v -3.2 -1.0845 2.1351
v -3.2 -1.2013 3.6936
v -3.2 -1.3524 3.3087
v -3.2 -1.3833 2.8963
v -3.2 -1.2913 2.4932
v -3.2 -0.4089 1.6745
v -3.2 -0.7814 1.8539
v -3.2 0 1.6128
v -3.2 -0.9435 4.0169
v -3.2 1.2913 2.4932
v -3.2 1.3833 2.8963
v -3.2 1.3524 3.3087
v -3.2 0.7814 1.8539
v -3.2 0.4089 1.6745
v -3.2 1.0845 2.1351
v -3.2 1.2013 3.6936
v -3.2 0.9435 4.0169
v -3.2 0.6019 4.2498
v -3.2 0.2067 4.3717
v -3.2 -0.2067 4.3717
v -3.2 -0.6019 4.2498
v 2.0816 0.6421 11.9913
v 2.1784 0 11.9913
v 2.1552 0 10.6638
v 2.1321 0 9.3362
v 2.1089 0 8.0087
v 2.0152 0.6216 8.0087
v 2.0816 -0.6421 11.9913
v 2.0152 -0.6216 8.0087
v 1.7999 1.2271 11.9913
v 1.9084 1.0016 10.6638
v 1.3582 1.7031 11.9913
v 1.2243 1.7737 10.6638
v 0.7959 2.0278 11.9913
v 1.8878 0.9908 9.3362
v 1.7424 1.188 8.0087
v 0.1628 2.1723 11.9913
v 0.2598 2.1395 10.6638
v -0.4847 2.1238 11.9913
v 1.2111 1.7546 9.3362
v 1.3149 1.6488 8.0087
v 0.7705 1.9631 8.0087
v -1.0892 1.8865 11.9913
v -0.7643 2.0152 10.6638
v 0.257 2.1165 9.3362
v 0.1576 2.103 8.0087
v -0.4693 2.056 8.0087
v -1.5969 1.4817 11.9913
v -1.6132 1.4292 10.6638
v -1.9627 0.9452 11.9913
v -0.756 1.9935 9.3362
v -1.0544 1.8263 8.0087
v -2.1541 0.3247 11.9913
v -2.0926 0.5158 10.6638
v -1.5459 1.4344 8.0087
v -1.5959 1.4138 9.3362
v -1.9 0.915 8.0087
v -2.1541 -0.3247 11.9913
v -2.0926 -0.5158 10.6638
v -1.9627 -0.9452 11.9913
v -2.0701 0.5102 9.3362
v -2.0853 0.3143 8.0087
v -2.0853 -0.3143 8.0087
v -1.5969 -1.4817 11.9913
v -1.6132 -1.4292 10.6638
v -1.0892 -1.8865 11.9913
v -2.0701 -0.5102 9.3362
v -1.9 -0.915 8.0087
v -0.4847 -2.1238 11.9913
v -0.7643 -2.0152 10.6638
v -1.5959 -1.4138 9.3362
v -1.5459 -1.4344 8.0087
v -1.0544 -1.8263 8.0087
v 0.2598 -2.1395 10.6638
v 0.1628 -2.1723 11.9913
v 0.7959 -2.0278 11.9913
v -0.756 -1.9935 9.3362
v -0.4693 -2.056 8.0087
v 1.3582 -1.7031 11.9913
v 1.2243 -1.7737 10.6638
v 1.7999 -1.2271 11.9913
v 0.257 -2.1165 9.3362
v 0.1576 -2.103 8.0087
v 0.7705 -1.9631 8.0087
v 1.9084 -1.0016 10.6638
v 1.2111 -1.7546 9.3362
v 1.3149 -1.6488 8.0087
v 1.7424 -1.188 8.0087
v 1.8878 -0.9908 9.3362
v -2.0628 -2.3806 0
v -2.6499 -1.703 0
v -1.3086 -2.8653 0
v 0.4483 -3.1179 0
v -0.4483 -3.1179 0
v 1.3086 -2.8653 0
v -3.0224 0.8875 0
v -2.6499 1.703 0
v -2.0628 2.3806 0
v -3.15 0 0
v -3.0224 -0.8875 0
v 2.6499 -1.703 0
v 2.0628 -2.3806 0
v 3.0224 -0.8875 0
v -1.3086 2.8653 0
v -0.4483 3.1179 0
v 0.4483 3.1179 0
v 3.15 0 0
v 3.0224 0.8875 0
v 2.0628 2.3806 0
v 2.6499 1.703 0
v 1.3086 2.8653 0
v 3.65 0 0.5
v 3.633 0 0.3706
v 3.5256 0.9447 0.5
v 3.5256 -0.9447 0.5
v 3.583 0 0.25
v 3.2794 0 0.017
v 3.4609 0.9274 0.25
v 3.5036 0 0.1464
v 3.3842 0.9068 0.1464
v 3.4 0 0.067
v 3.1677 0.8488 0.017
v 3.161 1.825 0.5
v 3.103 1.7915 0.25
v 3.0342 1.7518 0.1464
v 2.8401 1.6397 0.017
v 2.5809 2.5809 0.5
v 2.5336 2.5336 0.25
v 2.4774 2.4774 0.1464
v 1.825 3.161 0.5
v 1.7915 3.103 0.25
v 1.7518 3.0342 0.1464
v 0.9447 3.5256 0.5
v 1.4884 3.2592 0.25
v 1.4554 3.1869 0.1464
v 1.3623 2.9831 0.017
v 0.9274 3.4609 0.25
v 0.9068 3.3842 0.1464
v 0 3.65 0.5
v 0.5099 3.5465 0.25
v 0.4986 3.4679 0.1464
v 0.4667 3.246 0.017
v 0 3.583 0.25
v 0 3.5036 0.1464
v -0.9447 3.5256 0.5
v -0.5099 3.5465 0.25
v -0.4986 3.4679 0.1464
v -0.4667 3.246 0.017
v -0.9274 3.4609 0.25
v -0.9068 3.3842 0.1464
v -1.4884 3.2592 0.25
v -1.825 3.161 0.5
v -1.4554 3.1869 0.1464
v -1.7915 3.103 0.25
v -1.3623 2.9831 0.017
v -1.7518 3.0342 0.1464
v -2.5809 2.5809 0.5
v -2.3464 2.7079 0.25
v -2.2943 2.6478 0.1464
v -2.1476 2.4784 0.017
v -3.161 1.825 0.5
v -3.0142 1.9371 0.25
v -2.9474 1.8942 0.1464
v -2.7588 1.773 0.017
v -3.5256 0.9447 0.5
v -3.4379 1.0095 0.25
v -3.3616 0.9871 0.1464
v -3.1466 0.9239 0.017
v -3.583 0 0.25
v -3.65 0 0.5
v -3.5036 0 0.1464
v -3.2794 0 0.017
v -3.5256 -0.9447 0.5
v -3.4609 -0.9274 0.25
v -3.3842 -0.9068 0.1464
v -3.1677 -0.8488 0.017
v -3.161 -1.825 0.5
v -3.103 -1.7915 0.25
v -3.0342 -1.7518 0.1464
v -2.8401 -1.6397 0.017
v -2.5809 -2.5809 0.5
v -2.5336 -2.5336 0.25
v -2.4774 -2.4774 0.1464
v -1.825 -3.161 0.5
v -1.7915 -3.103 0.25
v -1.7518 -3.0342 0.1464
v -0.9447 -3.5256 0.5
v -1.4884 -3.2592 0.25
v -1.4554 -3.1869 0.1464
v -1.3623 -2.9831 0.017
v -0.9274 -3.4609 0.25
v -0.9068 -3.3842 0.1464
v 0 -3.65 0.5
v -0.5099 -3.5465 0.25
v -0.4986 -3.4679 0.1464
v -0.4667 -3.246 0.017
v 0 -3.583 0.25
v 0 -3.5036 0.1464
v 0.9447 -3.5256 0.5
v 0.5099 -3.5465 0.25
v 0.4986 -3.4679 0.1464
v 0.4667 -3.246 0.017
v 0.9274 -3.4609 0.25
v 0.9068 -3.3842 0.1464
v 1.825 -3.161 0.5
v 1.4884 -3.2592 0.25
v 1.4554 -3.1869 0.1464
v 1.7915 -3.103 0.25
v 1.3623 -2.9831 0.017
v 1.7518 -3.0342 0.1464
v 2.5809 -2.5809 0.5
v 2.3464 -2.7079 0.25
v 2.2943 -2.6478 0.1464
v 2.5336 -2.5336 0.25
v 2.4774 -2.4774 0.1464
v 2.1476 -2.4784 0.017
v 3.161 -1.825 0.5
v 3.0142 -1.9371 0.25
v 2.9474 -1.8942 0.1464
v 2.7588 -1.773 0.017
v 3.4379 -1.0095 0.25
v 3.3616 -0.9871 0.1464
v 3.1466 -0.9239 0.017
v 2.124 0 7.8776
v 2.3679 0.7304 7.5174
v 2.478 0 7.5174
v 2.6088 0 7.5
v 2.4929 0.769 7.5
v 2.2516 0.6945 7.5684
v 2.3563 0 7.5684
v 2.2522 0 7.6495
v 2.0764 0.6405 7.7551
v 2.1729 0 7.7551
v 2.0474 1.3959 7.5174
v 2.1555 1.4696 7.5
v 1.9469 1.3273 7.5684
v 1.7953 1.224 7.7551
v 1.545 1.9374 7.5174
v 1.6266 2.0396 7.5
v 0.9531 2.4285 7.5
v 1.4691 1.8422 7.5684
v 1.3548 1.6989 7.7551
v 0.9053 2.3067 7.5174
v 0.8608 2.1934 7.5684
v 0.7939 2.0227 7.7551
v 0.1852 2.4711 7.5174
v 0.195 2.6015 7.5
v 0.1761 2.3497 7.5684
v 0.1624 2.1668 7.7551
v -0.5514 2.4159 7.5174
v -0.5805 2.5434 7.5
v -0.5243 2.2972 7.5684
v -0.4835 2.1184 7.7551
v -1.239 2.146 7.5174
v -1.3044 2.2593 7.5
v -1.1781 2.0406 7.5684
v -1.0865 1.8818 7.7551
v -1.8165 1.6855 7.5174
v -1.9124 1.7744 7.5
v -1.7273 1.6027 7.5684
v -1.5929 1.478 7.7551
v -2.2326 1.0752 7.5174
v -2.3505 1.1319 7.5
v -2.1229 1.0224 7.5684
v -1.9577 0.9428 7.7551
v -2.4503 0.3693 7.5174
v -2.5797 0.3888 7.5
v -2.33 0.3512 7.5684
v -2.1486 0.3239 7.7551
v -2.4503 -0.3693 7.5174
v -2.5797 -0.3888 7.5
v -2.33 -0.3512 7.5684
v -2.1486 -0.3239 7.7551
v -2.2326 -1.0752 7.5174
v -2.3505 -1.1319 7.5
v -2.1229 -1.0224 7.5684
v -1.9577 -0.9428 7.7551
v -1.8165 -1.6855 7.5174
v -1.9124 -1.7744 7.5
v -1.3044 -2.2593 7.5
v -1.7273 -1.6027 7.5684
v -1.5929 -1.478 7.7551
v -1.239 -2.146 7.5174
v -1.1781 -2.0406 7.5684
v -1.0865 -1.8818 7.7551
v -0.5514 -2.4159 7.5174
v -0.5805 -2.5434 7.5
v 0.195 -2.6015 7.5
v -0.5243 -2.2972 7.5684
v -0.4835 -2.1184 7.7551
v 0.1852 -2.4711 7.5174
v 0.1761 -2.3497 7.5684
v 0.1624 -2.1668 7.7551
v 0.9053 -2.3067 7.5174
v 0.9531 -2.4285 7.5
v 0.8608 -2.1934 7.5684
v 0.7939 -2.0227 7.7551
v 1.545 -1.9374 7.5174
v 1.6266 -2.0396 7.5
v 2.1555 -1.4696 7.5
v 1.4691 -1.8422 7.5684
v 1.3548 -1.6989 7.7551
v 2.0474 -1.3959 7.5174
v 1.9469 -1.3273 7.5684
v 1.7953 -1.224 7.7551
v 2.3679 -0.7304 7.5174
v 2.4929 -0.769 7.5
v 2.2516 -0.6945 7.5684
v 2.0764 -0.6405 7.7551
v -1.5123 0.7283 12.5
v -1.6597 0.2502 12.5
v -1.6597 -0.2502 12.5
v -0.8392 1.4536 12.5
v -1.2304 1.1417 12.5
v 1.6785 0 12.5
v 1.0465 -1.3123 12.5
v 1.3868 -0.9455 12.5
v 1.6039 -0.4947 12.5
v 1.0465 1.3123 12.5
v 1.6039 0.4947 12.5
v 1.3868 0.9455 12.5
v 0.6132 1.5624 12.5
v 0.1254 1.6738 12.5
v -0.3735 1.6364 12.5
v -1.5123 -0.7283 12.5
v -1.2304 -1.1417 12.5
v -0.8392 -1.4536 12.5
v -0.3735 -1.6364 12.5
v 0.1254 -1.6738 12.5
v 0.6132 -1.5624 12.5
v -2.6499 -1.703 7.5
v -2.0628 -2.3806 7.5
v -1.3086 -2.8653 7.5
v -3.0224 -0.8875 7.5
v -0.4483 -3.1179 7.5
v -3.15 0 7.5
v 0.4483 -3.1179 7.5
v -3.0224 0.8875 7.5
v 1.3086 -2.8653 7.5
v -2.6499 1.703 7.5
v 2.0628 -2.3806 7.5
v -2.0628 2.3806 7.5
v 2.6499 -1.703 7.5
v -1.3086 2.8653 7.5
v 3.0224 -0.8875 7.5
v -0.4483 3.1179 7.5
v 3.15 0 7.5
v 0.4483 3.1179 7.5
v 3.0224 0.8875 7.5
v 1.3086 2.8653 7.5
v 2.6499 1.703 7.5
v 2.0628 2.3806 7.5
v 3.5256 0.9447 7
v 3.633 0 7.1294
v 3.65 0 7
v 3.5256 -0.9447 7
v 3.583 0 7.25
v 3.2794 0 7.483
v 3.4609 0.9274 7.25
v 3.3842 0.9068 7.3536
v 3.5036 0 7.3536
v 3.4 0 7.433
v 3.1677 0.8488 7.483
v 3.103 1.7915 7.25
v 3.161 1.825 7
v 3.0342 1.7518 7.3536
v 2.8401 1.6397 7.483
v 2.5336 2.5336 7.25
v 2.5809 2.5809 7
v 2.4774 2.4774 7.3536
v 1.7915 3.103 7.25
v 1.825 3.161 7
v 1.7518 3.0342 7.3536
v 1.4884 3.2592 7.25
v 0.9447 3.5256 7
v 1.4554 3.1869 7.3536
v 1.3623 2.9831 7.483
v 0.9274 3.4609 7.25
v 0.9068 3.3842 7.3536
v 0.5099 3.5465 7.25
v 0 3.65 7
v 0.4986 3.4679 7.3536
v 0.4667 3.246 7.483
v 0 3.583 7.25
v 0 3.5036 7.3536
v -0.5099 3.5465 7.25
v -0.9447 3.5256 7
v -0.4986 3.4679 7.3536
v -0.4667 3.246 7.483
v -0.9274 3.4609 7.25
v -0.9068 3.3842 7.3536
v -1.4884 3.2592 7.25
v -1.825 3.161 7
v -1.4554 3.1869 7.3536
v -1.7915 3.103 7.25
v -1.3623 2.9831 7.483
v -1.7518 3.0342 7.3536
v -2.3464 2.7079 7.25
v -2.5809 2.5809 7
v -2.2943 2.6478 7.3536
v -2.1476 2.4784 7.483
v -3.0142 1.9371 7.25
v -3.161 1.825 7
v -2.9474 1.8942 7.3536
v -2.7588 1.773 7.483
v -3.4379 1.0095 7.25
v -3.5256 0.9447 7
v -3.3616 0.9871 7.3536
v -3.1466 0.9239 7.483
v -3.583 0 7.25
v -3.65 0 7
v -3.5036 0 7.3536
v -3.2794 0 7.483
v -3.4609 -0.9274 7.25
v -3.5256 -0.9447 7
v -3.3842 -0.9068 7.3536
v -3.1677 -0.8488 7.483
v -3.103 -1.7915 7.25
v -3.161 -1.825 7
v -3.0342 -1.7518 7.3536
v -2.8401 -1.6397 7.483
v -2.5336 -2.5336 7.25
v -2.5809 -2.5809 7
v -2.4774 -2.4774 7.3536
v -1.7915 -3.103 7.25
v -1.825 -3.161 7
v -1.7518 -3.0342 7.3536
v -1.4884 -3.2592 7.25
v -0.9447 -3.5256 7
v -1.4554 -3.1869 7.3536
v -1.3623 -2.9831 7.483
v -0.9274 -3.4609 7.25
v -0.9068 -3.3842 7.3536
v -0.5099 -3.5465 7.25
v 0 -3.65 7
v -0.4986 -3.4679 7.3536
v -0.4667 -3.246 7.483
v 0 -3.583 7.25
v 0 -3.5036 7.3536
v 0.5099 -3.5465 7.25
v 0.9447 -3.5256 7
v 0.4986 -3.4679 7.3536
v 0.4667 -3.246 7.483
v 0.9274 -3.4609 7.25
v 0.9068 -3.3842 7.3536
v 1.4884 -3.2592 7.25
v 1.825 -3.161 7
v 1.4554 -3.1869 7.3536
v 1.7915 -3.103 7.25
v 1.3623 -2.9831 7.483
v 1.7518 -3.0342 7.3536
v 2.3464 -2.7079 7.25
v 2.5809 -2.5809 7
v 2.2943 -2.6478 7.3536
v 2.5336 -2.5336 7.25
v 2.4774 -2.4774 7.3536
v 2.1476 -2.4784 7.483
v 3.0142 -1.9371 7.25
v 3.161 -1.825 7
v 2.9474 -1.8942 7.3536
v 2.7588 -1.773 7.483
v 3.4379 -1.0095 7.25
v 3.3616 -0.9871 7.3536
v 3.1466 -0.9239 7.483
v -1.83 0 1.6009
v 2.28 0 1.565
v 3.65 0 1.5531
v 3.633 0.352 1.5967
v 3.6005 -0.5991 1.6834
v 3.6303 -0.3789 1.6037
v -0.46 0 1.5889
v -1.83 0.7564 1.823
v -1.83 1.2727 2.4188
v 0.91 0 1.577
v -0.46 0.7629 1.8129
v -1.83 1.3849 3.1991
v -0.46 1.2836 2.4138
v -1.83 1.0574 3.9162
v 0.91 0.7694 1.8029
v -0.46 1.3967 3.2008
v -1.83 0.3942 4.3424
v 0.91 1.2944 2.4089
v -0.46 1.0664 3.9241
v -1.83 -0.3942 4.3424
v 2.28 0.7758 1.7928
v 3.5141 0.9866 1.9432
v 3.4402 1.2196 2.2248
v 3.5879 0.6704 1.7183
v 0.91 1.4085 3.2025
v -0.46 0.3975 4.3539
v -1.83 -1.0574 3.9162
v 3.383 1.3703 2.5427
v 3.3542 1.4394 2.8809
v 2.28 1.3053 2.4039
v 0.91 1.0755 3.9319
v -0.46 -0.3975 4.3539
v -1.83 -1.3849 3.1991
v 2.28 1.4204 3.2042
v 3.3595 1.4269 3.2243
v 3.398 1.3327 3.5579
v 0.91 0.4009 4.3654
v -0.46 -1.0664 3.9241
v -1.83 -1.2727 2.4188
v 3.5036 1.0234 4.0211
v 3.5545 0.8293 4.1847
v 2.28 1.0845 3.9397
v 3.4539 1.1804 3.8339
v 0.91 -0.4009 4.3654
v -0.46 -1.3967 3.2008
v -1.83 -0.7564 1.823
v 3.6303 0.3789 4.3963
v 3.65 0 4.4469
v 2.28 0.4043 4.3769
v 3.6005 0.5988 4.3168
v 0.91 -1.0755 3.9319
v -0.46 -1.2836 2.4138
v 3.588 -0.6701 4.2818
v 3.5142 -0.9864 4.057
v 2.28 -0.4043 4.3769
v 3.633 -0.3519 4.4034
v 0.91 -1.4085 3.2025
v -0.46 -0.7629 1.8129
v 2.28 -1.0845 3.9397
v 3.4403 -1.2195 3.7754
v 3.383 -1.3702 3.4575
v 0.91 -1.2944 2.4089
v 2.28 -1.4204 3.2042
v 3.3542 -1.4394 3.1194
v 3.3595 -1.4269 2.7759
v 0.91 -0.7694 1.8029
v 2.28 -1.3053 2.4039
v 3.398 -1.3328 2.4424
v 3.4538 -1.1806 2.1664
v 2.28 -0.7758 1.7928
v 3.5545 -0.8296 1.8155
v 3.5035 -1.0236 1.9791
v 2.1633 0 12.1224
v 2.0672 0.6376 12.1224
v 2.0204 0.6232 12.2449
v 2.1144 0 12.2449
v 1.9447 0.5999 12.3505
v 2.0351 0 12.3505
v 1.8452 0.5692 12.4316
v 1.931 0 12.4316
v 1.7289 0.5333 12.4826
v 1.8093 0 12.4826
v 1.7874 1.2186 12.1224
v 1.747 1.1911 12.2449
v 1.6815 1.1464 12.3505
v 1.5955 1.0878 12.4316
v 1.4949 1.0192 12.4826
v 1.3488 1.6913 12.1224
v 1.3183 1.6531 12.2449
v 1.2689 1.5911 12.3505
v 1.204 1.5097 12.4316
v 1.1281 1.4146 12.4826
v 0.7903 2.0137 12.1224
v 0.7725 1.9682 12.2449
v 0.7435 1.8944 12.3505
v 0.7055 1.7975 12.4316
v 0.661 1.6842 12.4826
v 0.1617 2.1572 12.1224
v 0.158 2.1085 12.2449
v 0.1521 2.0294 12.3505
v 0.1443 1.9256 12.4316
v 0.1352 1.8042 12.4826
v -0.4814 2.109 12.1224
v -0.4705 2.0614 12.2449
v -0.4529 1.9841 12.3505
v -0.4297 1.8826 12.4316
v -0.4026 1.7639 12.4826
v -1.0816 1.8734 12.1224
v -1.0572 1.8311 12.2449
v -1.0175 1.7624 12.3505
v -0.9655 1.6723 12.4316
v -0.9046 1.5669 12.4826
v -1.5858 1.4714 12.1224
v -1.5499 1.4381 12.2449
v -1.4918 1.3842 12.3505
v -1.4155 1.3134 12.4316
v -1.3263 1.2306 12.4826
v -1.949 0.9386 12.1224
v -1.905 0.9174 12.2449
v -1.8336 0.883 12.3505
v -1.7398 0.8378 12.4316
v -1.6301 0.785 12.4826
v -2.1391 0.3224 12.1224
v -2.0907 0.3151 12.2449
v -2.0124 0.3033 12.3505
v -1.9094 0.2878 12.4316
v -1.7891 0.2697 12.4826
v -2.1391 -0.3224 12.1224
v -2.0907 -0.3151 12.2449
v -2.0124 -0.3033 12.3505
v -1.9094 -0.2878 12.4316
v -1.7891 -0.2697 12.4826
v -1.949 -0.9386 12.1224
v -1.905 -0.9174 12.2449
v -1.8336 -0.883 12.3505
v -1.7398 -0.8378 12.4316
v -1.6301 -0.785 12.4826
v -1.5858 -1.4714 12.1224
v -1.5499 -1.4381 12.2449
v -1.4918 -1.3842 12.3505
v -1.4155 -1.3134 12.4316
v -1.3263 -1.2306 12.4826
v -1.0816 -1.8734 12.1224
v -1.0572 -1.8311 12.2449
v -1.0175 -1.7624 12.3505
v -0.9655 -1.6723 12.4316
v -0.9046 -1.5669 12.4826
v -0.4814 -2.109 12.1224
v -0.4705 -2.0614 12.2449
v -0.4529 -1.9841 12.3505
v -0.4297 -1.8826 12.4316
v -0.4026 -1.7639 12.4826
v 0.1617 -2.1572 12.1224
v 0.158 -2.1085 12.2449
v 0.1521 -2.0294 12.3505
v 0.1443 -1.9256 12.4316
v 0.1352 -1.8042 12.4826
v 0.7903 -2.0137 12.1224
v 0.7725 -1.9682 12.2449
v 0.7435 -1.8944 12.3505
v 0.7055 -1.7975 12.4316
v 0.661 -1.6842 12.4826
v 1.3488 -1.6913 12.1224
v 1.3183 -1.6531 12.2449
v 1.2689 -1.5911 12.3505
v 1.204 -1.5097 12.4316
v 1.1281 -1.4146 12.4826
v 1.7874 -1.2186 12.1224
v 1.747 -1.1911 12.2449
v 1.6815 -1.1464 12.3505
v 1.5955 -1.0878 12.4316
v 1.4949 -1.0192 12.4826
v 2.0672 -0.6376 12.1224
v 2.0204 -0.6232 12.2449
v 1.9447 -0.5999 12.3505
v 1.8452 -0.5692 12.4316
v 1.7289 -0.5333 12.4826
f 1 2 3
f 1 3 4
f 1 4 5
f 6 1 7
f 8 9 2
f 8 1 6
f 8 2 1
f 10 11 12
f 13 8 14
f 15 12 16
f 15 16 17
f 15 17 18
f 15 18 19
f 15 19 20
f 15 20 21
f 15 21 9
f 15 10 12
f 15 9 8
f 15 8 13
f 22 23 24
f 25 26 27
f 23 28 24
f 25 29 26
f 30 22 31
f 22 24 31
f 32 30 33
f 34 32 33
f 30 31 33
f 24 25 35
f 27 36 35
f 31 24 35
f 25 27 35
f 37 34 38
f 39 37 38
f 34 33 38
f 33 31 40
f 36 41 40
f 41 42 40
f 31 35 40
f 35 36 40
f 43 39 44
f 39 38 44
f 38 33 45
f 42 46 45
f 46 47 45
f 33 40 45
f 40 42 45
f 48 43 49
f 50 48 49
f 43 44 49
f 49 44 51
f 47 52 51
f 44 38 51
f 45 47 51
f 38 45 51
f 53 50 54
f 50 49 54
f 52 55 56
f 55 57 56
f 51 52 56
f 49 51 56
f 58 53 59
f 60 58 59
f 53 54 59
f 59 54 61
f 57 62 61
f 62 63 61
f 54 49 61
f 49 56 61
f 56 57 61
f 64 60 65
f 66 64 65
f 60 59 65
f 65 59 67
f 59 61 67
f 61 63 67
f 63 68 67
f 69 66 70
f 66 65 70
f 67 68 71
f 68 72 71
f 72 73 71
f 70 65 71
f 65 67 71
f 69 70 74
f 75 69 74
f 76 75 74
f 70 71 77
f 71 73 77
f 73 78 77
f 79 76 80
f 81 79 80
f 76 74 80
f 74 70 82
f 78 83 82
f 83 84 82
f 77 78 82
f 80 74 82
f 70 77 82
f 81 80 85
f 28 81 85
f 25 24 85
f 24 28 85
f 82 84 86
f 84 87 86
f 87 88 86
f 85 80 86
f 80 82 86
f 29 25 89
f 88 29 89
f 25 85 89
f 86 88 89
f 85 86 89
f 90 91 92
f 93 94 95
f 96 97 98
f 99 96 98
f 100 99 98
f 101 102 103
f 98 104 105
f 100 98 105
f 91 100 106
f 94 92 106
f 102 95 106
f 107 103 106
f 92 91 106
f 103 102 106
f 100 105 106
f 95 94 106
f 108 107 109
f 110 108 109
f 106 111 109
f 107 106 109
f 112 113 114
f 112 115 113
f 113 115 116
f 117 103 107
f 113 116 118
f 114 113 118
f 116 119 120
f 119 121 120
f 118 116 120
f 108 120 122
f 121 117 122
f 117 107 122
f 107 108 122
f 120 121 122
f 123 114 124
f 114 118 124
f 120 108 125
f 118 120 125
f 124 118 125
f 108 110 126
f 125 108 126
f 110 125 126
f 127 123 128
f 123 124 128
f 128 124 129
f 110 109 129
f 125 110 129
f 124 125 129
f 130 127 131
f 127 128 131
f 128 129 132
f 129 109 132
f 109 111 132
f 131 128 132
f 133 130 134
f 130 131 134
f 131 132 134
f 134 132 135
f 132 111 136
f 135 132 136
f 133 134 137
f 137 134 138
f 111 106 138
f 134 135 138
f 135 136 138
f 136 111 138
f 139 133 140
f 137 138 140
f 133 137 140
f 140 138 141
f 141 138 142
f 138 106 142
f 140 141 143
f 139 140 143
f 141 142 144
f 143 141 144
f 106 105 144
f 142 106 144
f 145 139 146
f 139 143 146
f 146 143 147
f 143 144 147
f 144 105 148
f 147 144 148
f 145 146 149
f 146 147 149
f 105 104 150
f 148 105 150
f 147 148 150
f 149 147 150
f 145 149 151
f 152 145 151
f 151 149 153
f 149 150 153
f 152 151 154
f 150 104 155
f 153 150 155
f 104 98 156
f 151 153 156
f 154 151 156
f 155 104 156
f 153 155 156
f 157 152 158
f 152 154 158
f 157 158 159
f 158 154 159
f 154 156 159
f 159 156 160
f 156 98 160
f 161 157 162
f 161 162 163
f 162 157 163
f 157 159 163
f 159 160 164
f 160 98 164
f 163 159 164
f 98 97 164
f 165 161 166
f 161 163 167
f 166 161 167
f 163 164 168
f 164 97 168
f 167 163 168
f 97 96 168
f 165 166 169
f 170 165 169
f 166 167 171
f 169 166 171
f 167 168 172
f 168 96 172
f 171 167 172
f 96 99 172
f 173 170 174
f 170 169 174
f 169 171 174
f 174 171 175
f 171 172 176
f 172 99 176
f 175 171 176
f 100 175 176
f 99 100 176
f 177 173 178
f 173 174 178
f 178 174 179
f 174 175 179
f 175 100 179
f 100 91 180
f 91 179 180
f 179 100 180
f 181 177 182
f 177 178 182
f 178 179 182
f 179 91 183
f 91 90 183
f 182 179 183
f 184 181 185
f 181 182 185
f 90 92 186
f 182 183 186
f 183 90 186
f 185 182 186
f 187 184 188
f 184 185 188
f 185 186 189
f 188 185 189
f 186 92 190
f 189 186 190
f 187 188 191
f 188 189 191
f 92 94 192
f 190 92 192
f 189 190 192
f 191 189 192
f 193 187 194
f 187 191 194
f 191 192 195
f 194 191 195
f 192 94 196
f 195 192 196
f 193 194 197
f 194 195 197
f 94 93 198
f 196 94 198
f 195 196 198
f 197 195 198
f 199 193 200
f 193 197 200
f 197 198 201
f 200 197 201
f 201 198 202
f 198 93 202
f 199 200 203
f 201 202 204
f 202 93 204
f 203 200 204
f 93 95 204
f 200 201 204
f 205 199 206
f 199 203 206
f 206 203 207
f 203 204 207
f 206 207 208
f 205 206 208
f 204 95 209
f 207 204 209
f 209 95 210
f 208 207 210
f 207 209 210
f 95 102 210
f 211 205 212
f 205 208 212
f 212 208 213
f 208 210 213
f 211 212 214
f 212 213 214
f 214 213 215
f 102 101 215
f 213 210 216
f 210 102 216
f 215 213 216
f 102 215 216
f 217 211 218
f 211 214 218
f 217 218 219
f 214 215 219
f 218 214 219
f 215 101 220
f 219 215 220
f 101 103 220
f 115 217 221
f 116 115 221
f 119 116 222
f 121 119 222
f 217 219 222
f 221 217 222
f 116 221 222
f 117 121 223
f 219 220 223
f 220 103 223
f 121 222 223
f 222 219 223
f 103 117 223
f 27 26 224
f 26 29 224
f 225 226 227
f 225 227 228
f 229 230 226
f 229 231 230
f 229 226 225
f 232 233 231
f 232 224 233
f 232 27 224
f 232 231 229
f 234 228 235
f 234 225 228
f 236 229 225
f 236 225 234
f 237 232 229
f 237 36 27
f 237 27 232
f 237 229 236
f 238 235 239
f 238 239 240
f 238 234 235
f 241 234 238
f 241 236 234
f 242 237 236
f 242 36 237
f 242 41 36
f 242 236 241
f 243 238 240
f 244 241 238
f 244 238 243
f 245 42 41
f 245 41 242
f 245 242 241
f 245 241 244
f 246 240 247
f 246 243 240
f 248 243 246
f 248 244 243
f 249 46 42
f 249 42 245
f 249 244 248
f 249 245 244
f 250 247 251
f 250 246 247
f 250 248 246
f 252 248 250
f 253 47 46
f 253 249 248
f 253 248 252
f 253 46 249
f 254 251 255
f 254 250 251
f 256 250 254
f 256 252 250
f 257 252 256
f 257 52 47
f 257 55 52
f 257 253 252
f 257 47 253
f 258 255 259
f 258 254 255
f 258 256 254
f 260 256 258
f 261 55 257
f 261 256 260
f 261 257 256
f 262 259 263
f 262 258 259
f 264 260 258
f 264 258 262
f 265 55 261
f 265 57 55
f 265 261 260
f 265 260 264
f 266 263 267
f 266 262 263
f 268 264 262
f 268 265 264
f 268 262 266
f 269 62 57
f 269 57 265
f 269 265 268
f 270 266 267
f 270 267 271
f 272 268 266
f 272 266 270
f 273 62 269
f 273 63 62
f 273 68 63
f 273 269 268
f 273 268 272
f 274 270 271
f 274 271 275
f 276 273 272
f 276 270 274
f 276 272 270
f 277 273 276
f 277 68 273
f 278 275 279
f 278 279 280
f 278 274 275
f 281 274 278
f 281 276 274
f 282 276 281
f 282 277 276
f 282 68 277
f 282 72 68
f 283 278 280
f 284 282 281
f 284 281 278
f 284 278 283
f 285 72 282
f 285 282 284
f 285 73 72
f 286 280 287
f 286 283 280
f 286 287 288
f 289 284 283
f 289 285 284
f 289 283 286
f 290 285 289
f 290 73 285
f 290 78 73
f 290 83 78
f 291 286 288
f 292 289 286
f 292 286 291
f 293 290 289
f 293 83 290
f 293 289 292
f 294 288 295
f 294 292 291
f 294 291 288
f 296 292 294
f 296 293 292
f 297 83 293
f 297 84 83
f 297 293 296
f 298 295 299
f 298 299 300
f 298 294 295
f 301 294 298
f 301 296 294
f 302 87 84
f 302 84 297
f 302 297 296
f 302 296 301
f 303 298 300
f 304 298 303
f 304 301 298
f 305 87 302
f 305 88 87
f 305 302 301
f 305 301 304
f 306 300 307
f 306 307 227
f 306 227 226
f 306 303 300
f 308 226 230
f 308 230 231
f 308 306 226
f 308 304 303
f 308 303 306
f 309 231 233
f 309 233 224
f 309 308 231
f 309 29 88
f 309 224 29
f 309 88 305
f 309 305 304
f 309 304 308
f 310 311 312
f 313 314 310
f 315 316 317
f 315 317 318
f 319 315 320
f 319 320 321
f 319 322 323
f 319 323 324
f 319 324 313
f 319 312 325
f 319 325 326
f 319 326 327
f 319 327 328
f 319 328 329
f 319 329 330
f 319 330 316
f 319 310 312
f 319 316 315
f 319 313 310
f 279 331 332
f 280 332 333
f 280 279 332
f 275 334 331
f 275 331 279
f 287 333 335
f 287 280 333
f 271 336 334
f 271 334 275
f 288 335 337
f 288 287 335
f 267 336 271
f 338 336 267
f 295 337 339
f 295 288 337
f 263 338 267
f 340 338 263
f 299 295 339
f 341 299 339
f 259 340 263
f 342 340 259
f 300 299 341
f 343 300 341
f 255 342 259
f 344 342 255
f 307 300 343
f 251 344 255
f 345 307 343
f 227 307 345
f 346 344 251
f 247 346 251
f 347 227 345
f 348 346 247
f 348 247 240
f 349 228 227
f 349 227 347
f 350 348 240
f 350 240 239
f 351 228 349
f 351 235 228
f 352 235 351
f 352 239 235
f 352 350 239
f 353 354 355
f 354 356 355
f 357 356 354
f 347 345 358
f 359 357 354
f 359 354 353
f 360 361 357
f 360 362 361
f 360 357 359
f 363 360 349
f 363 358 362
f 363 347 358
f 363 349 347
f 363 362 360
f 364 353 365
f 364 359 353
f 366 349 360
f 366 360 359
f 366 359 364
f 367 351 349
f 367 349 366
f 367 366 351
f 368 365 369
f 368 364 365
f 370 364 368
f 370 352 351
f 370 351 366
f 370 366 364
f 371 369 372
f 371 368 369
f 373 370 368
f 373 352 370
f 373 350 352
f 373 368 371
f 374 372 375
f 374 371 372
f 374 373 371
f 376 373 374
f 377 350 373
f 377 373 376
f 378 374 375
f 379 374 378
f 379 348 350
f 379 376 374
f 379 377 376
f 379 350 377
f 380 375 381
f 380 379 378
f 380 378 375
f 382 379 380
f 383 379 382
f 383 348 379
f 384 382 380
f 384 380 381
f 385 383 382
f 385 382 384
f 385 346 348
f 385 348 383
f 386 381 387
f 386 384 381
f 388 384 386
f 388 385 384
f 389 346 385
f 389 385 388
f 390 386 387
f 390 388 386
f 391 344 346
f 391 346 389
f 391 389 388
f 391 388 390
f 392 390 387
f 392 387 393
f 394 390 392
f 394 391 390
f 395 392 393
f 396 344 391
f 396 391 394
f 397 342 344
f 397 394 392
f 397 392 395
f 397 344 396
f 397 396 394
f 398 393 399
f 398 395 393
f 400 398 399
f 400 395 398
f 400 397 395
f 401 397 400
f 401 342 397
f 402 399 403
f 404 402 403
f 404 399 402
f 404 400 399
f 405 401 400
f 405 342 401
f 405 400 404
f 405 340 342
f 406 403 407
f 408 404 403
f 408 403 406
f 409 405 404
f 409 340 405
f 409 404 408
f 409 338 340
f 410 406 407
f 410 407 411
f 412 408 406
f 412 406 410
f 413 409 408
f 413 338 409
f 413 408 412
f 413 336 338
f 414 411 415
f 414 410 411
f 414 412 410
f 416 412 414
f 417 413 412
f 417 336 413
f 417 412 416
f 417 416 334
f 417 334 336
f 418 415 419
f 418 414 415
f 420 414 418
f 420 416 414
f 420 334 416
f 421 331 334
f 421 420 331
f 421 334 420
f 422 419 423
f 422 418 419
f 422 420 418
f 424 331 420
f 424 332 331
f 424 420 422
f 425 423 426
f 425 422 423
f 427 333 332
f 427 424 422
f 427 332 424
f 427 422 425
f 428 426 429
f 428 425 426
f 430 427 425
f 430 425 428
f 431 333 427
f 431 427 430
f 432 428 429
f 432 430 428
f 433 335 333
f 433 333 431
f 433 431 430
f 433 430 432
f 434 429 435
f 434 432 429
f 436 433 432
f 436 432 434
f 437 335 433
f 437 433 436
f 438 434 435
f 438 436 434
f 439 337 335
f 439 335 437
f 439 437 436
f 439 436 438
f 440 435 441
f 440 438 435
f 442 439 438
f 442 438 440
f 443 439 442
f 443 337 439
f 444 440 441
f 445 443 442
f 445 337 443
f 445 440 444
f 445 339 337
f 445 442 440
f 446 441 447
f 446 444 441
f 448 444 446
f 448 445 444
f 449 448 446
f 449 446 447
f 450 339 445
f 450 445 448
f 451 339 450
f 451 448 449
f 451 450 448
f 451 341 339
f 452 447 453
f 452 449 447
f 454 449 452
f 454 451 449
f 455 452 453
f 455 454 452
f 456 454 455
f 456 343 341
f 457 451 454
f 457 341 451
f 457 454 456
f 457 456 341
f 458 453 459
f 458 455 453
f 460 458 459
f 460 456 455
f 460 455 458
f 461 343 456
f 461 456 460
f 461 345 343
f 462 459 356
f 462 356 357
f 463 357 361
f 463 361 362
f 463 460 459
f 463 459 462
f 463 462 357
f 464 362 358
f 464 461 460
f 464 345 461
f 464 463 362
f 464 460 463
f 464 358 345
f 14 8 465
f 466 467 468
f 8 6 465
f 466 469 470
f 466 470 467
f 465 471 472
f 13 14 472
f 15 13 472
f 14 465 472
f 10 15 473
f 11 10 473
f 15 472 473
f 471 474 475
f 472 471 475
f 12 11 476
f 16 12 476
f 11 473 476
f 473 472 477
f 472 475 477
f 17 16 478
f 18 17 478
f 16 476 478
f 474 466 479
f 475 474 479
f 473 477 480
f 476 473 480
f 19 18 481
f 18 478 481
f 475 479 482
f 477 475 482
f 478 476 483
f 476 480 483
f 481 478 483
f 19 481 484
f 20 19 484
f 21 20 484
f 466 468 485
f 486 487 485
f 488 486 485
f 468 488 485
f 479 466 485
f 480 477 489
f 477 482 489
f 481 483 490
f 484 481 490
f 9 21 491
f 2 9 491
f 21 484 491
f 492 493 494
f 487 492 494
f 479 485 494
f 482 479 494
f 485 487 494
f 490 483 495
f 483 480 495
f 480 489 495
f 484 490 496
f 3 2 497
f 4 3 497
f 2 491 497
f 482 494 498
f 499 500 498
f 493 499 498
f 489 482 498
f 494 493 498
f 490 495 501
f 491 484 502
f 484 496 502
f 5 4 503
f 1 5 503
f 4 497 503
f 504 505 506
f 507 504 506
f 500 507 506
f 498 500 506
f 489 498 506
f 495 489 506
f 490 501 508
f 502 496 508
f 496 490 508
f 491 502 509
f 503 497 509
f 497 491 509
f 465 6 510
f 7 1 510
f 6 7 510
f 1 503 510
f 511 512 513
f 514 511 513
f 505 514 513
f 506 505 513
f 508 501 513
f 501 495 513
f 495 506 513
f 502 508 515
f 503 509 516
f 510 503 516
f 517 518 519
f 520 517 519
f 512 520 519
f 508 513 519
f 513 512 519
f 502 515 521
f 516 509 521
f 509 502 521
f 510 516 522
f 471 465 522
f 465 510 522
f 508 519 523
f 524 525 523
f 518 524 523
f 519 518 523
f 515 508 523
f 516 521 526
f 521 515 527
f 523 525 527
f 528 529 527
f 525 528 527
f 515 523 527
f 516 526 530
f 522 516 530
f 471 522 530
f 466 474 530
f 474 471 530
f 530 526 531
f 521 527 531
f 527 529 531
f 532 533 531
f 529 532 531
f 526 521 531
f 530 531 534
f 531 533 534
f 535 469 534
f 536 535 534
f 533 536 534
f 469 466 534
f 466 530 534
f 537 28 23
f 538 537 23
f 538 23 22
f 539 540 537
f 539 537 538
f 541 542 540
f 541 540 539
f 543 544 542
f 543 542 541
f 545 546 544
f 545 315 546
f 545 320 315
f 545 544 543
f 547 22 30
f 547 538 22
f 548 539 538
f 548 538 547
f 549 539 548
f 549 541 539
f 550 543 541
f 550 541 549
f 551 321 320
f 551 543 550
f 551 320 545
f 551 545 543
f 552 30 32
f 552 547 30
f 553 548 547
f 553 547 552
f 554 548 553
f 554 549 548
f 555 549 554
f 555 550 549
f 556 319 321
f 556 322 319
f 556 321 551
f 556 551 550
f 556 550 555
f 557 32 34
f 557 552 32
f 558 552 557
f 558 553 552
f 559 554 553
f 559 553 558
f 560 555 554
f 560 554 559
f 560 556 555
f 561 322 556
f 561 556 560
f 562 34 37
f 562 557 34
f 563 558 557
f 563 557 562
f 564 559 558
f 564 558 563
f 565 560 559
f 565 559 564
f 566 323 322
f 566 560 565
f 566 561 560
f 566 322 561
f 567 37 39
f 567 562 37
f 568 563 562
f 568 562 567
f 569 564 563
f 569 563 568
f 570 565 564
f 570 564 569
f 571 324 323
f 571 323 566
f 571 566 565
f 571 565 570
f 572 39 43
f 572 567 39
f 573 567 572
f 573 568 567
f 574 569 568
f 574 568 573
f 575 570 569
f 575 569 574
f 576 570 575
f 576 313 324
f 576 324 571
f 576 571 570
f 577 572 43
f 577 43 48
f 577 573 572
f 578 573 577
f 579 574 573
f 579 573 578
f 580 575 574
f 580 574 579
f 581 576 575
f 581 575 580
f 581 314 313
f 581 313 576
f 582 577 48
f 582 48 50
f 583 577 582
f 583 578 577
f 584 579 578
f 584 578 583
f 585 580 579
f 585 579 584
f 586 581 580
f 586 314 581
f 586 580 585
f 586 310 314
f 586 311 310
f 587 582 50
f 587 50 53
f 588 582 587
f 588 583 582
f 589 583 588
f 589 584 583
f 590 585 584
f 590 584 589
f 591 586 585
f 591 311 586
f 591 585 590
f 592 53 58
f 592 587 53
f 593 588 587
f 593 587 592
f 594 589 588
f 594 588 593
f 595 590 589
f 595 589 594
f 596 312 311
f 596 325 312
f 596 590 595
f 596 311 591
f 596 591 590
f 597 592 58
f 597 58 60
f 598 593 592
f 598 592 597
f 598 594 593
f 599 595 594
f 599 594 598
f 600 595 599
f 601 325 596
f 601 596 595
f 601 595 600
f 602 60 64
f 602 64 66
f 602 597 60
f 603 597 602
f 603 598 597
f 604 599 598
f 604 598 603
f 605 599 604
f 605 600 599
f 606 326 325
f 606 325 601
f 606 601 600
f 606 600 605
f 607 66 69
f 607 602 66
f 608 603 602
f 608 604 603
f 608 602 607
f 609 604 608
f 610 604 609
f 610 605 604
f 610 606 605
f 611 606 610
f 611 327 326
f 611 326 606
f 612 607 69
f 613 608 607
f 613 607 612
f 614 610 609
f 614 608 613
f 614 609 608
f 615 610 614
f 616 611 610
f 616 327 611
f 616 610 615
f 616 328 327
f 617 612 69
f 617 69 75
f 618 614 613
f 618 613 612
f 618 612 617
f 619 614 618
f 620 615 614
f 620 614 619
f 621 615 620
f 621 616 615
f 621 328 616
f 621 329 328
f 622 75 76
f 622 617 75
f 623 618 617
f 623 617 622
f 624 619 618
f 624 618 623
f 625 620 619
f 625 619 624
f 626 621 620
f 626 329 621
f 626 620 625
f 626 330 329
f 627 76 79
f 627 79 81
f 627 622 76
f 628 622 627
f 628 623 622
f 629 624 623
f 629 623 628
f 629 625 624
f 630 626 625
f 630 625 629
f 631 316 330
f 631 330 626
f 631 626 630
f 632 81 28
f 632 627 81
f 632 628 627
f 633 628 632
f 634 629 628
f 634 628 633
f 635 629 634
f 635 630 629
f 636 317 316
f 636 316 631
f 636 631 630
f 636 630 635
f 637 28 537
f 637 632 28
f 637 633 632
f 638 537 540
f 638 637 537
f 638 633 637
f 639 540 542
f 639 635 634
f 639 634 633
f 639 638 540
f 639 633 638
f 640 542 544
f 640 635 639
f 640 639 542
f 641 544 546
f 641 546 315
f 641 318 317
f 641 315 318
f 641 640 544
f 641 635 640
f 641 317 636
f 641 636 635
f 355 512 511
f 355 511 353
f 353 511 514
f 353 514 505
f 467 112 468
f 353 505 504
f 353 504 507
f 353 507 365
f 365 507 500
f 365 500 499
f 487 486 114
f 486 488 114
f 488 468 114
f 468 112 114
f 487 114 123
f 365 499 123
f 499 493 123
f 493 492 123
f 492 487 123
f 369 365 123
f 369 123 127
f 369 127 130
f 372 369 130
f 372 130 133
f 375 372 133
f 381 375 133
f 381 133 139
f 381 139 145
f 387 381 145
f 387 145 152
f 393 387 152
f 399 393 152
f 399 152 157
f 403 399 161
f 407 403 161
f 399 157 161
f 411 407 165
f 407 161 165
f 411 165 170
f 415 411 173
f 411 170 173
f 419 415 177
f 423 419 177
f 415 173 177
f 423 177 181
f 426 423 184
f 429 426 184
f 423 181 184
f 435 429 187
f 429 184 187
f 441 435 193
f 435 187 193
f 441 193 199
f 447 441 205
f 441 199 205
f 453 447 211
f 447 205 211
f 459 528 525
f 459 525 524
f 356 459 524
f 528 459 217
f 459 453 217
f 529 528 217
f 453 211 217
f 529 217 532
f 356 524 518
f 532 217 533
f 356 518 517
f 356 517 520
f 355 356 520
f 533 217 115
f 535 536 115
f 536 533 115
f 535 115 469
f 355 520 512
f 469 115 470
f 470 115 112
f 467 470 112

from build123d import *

# Parameters (mm, degrees)
ESQUISSE1_R             = 3.65
BOSS_EXTRU_1_DEPTH      = 7.5
ESQUISSE2_R             = 1.45
ENL_V_MAT_EXTRU_1_DEPTH = 7.2
ENL_V_MAT_EXTRU_1_DRAFT = -0.5
ESQUISSE3_R             = 2.1
BOSS_EXTRU_2_DEPTH      = 5
BOSS_EXTRU_2_DRAFT      = -1
CONG_2_R                = 0.5


with BuildPart() as part:
    # Esquisse1 → Boss.-Extru.1 (new body)
    with BuildSketch(Plane.XY):
        Circle(ESQUISSE1_R)
    extrude(amount=BOSS_EXTRU_1_DEPTH)


with BuildPart() as enl_v_mat_extru_1_tool:
    # Esquisse2 → Enlèv. mat.-Extru.1 (with draft: the straight prism first)
    with BuildSketch(Plane(origin=(4, 0, 0), x_dir=(0, 0, -1), z_dir=(1, 0, 0))):
        with Locations((-3, 0)):
            Circle(ESQUISSE2_R)
    extrude(amount=-ENL_V_MAT_EXTRU_1_DEPTH)
    # Enlèv. mat.-Extru.1: the draft: its side faces are tilted about the plane it starts from
    enl_v_mat_extru_1_sides = [enl_v_mat_extru_1_tool.faces().sort_by_distance(p)[0] for p in [
        (0.4, 0, 4.45),
    ]]
    draft(enl_v_mat_extru_1_sides, Plane(origin=(4, 0, 0), x_dir=(0, 0, -1), z_dir=(1, 0, 0)), ENL_V_MAT_EXTRU_1_DRAFT)


with BuildPart() as part_1:
    add(part.part)

    # Enlèv. mat.-Extru.1: cut by enl_v_mat_extru_1_tool
    add(enl_v_mat_extru_1_tool.part, mode=Mode.SUBTRACT)


with BuildPart() as boss_extru_2_tool:
    # Esquisse3 → Boss.-Extru.2 (with draft: the straight prism first)
    with BuildSketch(Plane.XY.offset(7.5)):
        Circle(ESQUISSE3_R)
    extrude(amount=BOSS_EXTRU_2_DEPTH)
    # Boss.-Extru.2: the draft: its side faces are tilted about the plane it starts from
    boss_extru_2_sides = [boss_extru_2_tool.faces().sort_by_distance(p)[0] for p in [
        (-2.1, 0, 10),
    ]]
    draft(boss_extru_2_sides, Plane.XY.offset(7.5), BOSS_EXTRU_2_DRAFT)


with BuildPart() as part_2:
    add(part_1.part)

    # Boss.-Extru.2: add boss_extru_2_tool
    add(boss_extru_2_tool.part)

    # Congé2
    cong_2_edges = [part_2.edges().sort_by_distance(p)[0] for p in [
        (-2.1, 0, 7.5),
        (-2.187275325, 0, 12.5),
        (-3.65, 0, 0),
        (-3.65, 0, 7.5),
    ]]
    fillet(cong_2_edges, radius=CONG_2_R)


solid = part_2.part
